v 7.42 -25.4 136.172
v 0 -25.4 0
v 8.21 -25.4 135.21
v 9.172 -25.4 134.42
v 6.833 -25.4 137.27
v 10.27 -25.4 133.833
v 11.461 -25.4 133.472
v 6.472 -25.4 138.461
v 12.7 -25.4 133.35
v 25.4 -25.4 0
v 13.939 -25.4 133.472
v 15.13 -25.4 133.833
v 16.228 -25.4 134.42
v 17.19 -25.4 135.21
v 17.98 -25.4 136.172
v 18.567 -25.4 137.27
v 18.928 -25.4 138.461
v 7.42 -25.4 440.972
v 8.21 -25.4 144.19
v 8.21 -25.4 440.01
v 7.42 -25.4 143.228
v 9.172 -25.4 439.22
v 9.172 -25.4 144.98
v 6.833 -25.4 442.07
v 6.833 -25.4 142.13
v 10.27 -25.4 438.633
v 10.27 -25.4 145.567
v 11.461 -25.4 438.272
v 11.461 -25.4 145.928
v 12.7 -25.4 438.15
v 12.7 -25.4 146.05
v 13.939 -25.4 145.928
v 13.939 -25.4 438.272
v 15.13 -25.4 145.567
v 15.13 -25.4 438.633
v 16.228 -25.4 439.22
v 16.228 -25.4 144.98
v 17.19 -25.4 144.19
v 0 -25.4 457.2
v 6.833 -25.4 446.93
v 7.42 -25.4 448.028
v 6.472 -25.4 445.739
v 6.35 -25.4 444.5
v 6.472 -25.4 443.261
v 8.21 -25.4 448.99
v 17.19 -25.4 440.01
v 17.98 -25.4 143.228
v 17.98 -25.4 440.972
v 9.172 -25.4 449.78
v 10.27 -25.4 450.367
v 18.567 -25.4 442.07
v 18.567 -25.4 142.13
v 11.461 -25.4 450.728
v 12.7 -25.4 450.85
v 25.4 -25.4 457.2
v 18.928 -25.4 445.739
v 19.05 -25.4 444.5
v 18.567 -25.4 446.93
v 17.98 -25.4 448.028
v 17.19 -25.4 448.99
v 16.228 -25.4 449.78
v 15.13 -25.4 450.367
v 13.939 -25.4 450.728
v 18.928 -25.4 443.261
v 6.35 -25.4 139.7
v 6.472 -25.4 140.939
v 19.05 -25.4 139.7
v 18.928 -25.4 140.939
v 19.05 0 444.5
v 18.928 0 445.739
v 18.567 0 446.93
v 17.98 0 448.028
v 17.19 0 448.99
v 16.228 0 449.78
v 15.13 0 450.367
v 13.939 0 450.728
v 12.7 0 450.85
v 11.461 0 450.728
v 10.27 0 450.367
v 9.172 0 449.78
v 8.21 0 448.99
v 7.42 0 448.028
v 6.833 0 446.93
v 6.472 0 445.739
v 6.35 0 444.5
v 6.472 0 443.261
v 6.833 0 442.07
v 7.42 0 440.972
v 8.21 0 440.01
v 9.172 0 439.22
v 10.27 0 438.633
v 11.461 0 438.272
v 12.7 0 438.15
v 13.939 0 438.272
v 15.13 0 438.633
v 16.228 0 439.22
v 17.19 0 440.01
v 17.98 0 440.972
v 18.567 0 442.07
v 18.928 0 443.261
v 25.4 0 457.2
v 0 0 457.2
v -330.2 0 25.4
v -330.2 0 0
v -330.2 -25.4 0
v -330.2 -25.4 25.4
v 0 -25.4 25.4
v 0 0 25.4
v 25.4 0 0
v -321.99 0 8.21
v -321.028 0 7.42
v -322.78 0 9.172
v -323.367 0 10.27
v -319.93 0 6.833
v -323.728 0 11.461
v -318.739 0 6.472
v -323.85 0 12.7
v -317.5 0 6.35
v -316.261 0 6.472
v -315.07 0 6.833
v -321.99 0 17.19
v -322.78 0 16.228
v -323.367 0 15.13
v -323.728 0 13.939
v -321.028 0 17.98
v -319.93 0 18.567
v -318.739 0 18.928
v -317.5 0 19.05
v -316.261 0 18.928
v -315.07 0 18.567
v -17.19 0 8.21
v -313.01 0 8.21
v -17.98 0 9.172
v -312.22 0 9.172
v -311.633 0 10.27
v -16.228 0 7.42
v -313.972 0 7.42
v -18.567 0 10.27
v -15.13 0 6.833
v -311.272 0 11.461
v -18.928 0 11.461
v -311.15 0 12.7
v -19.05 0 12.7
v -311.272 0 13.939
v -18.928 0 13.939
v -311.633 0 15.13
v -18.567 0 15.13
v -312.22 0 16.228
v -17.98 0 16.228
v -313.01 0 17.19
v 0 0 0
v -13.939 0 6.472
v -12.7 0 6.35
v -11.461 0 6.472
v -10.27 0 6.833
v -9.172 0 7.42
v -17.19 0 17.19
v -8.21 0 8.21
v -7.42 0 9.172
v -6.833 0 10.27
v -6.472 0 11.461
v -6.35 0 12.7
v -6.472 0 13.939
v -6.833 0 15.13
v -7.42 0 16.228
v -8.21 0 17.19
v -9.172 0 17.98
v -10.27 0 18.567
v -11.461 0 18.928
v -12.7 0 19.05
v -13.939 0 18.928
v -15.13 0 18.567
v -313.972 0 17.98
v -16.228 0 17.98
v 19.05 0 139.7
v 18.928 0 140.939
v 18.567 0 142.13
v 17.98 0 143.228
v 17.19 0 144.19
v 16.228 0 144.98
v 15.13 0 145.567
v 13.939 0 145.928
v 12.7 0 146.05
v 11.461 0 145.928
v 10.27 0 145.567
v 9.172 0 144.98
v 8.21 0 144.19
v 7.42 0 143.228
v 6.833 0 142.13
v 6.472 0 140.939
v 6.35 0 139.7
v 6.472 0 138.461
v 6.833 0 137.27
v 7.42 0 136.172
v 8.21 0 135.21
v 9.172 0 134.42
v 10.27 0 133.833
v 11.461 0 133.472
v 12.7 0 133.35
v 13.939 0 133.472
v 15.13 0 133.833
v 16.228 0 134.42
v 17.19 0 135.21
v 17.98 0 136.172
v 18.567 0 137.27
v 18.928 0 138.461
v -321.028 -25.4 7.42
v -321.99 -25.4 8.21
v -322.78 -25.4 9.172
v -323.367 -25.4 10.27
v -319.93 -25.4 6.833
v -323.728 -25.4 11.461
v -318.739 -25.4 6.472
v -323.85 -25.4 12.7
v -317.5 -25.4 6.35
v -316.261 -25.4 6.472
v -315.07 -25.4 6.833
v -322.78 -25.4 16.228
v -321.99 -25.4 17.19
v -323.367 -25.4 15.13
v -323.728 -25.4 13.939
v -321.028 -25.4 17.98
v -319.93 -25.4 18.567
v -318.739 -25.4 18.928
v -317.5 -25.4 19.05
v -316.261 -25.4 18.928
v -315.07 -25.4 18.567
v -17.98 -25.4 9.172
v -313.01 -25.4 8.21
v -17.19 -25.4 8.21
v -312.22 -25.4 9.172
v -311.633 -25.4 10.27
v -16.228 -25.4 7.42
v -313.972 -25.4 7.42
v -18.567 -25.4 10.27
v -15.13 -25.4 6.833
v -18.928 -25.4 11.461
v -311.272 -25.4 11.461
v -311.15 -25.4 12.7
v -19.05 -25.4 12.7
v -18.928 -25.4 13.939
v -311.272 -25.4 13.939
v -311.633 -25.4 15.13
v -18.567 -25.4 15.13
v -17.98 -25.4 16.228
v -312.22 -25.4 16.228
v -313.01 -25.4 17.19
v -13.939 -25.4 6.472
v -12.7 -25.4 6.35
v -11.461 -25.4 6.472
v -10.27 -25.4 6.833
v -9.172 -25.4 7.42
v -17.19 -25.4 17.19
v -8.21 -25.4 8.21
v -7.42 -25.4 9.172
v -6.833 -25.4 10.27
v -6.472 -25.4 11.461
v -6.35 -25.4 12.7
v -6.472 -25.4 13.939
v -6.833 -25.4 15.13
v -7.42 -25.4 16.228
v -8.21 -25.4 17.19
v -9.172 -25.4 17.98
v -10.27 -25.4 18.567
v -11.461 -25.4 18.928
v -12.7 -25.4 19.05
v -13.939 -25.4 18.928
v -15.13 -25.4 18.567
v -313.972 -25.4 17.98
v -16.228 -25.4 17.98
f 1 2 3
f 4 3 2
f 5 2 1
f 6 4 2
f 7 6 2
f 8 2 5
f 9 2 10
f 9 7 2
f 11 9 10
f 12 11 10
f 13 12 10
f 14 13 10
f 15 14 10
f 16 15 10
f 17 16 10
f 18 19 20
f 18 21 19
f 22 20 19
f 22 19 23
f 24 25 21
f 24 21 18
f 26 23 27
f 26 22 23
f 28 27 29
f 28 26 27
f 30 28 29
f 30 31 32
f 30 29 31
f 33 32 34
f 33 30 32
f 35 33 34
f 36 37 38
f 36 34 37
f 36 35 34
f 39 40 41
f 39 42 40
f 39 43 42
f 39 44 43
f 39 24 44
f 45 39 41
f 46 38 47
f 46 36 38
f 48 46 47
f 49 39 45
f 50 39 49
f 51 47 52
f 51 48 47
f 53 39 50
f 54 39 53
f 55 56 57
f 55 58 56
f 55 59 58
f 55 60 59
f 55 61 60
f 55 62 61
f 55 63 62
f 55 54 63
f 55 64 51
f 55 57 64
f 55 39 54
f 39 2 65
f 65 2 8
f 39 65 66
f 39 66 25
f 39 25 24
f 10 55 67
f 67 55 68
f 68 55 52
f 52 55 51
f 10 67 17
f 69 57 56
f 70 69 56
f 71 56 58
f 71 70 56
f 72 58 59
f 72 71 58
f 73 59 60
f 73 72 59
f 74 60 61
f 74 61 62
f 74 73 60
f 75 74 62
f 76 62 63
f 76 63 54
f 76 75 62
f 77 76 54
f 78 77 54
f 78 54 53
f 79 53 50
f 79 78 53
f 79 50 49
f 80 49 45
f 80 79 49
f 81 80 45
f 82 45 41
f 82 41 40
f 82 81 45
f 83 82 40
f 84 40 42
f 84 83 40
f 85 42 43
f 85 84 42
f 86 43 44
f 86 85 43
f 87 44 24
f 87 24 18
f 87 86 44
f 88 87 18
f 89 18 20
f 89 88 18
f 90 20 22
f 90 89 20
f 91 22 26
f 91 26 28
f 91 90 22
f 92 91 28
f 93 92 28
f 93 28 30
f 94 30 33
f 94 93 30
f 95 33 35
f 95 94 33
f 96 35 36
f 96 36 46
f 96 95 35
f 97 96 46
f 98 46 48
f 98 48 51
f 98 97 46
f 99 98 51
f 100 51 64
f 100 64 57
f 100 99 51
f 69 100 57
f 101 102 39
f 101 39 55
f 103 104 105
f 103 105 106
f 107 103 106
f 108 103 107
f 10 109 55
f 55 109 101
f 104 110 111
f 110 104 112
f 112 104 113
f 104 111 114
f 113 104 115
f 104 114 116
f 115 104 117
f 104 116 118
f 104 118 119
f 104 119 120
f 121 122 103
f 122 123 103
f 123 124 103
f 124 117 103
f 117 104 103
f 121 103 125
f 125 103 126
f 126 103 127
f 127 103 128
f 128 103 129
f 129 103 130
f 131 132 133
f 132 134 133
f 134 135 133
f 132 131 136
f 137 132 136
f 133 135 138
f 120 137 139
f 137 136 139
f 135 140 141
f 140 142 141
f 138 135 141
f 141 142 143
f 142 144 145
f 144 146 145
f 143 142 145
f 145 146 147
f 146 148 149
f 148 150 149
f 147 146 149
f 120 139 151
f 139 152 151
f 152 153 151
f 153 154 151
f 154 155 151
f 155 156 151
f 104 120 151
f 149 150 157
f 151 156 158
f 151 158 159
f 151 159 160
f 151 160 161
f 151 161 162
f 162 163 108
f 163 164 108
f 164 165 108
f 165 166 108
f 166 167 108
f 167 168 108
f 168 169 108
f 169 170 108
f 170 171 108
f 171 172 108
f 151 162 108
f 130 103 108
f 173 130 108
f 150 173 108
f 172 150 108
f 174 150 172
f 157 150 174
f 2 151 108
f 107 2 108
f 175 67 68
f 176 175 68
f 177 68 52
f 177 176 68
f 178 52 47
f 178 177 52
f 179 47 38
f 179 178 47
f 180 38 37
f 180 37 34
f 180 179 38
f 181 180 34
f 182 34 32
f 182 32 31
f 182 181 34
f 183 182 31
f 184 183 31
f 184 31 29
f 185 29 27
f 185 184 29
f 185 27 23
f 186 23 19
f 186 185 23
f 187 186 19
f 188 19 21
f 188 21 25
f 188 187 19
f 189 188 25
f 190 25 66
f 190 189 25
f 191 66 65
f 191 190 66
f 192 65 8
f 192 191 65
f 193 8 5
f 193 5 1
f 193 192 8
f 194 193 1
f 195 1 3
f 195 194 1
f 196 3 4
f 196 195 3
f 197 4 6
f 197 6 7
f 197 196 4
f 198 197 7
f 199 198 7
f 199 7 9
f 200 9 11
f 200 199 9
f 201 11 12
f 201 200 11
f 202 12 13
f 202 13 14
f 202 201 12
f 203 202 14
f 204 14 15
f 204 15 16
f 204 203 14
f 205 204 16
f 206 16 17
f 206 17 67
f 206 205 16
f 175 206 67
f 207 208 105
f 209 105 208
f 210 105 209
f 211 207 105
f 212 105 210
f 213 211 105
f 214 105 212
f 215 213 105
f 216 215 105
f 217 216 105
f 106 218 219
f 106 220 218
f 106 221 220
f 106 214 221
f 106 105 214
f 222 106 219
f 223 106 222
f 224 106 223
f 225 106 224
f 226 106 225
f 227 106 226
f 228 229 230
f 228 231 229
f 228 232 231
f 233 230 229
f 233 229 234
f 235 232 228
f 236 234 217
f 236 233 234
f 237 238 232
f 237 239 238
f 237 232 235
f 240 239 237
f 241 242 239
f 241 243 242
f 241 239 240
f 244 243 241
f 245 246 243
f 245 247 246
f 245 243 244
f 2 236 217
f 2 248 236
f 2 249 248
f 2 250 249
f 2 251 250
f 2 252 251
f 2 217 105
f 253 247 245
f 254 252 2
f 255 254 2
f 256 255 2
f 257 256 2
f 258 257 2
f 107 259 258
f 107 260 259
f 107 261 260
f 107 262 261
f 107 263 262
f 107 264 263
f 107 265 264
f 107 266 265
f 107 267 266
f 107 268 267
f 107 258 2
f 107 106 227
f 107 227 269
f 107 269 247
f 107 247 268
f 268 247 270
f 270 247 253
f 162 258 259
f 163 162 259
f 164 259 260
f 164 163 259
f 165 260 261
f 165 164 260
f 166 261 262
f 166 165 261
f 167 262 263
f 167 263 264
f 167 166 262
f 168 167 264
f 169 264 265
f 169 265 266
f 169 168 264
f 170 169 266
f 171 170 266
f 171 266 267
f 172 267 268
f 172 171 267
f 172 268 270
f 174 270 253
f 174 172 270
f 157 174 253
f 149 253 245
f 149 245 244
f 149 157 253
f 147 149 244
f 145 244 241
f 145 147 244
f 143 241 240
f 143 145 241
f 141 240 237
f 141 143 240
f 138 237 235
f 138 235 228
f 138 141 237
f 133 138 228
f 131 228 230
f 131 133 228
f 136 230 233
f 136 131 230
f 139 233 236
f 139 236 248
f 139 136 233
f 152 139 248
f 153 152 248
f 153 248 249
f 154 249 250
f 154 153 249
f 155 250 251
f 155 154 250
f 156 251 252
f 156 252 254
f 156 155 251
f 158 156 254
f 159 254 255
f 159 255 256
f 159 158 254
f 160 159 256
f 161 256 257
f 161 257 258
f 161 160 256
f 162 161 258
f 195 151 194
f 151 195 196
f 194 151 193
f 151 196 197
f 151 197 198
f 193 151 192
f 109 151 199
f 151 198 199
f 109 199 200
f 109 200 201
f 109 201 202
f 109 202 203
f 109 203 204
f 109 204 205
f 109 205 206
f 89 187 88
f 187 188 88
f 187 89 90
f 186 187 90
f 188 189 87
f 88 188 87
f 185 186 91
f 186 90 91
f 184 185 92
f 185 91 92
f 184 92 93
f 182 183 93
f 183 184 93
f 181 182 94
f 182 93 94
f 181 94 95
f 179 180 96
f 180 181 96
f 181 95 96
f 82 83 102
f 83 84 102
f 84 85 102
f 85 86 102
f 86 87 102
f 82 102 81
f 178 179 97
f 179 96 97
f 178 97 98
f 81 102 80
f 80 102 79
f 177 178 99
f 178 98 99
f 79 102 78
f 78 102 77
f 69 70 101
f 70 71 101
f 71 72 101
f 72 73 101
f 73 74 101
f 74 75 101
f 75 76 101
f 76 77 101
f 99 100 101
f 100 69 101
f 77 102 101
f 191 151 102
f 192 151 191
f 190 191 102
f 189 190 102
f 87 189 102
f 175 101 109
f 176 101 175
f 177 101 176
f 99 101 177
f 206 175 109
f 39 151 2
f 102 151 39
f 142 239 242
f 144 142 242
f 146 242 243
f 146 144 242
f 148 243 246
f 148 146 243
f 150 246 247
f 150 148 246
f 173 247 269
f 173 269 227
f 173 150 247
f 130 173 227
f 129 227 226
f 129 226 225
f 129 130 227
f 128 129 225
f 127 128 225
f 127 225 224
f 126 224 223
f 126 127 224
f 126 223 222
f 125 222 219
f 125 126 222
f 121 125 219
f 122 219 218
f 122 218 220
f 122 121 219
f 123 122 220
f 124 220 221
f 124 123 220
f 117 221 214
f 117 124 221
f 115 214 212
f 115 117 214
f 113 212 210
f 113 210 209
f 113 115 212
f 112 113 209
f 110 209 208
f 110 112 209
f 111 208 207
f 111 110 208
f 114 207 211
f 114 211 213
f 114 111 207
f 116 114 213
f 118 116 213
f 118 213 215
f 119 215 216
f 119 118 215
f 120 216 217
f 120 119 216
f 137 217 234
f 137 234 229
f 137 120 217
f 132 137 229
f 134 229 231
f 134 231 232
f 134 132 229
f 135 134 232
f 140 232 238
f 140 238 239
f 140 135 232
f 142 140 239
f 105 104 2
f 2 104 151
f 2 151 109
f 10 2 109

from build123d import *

# Parameters (mm, degrees)
F0_W     = 25.4
F0_H     = 457.2
F0_R     = 6.35
F1_DEPTH = 25.4
F2_W     = 330.2
F2_H     = 25.4
F2_R     = 6.35
F3_DEPTH = 25.4


with BuildPart() as f1:
    # F0 (on Front) → F1 (new body)
    with BuildSketch(Plane.XZ):
        with Locations((12.7, 228.6)):
            Rectangle(F0_W, F0_H)
        with Locations((12.7, 139.7)):
            Circle(F0_R, mode=Mode.SUBTRACT)
        with Locations((12.7, 444.5)):
            Circle(F0_R, mode=Mode.SUBTRACT)
    extrude(amount=F1_DEPTH)


with BuildPart() as f3:
    # F2 (on Front) → F3 (new body)
    with BuildSketch(Plane.XZ):
        with Locations((-165.1, 12.7)):
            Rectangle(F2_W, F2_H)
        with Locations((-317.5, 12.7)):
            Circle(F2_R, mode=Mode.SUBTRACT)
        with Locations((-12.7, 12.7)):
            Circle(F2_R, mode=Mode.SUBTRACT)
    extrude(amount=F3_DEPTH)


solid = Compound([f1.part, f3.part])
